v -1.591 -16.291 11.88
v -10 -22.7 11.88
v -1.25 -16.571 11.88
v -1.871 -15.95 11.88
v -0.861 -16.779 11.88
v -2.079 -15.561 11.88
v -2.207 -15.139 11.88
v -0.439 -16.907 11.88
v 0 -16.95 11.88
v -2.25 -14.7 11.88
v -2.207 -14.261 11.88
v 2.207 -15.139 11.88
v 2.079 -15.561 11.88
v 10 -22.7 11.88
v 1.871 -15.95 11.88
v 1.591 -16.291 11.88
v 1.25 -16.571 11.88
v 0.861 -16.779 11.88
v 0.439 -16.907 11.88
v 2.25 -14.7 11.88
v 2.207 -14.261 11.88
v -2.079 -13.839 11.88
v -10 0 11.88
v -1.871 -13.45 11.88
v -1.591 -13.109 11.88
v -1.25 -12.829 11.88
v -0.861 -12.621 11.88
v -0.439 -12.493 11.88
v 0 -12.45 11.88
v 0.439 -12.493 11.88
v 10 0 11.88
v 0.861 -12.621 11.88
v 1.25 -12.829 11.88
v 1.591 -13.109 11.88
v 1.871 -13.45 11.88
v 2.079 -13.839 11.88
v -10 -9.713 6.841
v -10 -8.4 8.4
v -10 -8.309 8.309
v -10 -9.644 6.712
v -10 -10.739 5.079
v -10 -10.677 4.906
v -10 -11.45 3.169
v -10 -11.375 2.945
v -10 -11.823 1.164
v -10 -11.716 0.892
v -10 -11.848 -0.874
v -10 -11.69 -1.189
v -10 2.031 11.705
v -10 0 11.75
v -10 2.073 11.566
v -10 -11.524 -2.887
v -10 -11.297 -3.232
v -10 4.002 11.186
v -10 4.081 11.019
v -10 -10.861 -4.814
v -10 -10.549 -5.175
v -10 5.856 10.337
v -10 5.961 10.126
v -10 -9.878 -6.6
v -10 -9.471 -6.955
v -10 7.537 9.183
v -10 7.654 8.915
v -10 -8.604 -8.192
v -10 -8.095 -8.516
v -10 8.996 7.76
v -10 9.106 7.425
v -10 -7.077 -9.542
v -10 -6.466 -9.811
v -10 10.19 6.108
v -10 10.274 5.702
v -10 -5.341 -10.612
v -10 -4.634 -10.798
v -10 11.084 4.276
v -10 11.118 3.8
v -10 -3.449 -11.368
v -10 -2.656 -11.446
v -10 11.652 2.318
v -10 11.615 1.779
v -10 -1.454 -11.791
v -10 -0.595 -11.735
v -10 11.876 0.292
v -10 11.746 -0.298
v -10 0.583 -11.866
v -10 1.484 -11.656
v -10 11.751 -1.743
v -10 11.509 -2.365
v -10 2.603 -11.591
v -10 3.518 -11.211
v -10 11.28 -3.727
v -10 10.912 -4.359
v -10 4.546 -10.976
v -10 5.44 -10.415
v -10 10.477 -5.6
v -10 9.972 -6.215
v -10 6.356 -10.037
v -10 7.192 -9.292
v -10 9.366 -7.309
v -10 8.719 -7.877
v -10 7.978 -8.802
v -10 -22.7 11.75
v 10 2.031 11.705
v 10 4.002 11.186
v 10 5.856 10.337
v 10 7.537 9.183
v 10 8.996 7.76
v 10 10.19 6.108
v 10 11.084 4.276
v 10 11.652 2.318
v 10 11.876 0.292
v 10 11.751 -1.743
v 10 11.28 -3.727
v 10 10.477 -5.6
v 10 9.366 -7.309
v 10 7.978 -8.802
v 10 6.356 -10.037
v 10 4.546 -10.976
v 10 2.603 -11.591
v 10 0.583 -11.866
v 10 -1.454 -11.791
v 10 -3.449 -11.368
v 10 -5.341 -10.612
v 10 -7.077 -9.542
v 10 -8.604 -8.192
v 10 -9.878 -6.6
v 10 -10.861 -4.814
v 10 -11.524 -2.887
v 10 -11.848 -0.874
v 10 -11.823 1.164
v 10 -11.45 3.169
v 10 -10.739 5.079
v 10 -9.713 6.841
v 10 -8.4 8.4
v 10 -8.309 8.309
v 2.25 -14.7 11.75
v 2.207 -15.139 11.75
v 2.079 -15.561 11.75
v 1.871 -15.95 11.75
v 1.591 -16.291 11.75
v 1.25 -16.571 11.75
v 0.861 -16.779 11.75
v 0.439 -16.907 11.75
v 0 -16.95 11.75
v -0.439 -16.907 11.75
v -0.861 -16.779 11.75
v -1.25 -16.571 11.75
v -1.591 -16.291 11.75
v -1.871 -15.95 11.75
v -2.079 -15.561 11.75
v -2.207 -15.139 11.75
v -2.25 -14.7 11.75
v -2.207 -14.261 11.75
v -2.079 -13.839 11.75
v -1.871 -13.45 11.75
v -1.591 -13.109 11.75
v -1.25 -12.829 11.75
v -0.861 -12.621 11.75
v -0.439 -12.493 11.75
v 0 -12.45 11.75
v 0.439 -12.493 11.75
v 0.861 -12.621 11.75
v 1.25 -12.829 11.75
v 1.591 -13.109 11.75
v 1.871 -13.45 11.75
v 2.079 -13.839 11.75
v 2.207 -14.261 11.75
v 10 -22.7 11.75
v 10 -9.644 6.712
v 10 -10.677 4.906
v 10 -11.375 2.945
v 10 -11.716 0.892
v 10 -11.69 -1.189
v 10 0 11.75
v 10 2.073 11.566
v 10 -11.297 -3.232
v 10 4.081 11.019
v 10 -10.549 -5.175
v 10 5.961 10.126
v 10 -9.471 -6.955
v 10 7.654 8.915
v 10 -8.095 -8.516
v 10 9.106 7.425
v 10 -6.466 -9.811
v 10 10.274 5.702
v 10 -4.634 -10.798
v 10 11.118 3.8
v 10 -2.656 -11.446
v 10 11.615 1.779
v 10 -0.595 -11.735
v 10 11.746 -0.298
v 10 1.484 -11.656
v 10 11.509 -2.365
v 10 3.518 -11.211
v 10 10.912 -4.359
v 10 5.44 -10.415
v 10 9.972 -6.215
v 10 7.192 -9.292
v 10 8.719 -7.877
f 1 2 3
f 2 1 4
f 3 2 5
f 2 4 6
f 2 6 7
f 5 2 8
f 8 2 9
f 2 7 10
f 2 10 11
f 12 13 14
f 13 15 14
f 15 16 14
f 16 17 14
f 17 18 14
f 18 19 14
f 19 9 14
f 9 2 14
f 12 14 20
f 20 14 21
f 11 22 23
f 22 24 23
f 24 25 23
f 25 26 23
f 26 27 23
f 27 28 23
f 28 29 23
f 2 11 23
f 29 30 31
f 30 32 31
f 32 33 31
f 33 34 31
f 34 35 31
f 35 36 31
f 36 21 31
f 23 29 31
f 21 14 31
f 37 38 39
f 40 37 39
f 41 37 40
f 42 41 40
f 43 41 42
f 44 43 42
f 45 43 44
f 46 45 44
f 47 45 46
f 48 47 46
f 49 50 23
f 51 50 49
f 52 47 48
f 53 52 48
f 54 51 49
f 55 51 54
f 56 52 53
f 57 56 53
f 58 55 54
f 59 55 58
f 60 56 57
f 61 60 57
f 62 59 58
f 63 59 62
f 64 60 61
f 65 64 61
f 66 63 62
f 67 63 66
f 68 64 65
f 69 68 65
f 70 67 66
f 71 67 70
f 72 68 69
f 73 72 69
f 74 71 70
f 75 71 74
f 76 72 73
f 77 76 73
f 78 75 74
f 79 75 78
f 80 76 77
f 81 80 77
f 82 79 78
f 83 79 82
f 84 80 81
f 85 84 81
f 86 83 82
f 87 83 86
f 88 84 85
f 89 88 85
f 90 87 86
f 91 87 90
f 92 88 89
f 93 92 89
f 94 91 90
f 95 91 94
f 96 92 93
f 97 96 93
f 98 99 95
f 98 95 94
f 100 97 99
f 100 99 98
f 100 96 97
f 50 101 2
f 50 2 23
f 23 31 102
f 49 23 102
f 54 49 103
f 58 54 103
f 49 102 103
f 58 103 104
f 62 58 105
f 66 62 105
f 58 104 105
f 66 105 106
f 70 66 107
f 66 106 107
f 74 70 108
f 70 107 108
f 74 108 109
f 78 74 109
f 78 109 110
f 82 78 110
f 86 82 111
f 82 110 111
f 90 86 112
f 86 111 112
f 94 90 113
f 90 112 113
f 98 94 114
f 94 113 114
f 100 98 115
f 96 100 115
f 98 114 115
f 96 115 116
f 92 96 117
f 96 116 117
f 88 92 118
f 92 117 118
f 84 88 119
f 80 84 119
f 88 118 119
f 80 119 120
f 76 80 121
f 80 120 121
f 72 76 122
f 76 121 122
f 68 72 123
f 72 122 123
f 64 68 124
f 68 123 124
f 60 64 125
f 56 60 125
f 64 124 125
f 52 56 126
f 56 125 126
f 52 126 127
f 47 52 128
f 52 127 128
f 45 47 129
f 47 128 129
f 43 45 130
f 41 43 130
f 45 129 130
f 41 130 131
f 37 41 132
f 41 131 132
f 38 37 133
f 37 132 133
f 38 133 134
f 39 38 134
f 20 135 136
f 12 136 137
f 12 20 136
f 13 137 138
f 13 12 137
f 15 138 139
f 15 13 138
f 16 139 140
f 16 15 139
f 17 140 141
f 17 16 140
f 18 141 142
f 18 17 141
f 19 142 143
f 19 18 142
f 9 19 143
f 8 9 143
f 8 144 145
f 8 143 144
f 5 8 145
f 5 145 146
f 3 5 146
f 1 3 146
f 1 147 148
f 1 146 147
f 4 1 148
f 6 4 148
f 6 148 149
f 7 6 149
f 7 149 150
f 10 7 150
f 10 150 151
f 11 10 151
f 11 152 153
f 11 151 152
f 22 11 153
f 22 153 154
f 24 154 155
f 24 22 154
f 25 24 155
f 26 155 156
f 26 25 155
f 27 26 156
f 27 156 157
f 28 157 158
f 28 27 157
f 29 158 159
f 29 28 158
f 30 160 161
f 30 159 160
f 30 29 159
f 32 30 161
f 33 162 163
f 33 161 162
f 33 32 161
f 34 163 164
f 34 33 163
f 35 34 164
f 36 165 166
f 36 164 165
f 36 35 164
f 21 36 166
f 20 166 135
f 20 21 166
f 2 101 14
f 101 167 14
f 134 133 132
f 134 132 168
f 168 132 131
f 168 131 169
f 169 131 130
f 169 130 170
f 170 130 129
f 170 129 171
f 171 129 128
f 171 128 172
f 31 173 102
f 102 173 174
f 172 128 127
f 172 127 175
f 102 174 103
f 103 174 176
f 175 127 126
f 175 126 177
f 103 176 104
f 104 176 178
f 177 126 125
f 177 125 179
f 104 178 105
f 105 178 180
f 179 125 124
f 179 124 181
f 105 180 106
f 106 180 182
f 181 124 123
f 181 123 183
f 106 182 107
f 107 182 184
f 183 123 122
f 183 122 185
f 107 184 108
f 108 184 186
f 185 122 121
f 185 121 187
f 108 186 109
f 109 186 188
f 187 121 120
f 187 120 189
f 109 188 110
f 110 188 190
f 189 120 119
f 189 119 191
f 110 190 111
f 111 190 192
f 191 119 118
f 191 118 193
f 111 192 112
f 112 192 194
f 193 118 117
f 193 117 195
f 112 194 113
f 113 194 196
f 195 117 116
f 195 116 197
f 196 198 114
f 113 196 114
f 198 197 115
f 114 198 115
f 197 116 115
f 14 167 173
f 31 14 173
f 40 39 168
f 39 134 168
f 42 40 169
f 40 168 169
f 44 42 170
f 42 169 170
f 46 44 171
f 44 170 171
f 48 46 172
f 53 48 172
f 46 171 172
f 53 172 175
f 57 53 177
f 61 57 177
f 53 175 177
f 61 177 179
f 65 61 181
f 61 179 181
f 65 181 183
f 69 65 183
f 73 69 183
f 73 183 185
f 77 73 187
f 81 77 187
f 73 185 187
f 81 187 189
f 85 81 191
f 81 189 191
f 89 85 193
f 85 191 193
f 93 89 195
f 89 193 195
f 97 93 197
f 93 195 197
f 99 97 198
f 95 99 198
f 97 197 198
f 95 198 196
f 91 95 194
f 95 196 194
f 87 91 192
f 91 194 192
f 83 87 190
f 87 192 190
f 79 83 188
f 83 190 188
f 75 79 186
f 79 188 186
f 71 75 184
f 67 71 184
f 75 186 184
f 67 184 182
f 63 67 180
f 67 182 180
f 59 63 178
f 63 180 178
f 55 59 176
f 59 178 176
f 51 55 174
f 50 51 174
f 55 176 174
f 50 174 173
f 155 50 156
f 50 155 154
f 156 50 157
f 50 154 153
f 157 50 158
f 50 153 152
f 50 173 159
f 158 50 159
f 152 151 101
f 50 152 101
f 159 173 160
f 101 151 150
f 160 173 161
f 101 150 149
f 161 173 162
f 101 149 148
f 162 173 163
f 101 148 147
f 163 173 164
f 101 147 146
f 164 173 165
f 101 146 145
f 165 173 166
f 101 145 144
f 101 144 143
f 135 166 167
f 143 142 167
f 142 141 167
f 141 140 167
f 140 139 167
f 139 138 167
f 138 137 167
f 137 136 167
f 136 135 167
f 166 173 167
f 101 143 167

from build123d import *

# Parameters (mm, degrees)
BOSS_EXTRUDE1_DEPTH = 10
CUT_EXTRUDE1_REACH  = 36.349
SKETCH2_R           = 2.25


with BuildPart() as part:
    # Sketch1 → Boss-Extrude1 (new, symmetric)
    with BuildSketch(Plane(origin=(0, 0, 0), x_dir=(0, -1, 0), z_dir=(1, 0, 0))):
        with BuildLine():
            Line((8.40042856, -8.40042856), (8.308504679, -8.308504679))
            ThreePointArc((8.308504679, -8.308504679), (-4.49653033, 10.855584507), (0, -11.75))
            Line((0, -11.75), (22.7, -11.75))
            Line((22.7, -11.75), (22.7, -11.88))
            Line((22.7, -11.88), (0, -11.88))
            ThreePointArc((0, -11.88), (-4.546279176, 10.975688846), (8.40042856, -8.40042856))
        make_face()
    extrude(amount=BOSS_EXTRUDE1_DEPTH, both=True)

    # Sketch2 → Cut-Extrude1 (cut, up to next)
    with BuildSketch(Plane(origin=(0, 0, 11.88), x_dir=(-1, 0, 0), z_dir=(0, 0, -1)), mode=Mode.PRIVATE) as cut_extrude1_sk1:
        with Locations(Location((0, -14.7, 0), (0, 0, 180))):
            Circle(SKETCH2_R)
    cut_extrude1_tool1 = extrude(cut_extrude1_sk1.sketch, amount=CUT_EXTRUDE1_REACH, mode=Mode.PRIVATE) & part.part
    add(cut_extrude1_tool1.solids().sort_by_distance((0, -14.7, 11.88))[0], mode=Mode.SUBTRACT)


solid = part.part
